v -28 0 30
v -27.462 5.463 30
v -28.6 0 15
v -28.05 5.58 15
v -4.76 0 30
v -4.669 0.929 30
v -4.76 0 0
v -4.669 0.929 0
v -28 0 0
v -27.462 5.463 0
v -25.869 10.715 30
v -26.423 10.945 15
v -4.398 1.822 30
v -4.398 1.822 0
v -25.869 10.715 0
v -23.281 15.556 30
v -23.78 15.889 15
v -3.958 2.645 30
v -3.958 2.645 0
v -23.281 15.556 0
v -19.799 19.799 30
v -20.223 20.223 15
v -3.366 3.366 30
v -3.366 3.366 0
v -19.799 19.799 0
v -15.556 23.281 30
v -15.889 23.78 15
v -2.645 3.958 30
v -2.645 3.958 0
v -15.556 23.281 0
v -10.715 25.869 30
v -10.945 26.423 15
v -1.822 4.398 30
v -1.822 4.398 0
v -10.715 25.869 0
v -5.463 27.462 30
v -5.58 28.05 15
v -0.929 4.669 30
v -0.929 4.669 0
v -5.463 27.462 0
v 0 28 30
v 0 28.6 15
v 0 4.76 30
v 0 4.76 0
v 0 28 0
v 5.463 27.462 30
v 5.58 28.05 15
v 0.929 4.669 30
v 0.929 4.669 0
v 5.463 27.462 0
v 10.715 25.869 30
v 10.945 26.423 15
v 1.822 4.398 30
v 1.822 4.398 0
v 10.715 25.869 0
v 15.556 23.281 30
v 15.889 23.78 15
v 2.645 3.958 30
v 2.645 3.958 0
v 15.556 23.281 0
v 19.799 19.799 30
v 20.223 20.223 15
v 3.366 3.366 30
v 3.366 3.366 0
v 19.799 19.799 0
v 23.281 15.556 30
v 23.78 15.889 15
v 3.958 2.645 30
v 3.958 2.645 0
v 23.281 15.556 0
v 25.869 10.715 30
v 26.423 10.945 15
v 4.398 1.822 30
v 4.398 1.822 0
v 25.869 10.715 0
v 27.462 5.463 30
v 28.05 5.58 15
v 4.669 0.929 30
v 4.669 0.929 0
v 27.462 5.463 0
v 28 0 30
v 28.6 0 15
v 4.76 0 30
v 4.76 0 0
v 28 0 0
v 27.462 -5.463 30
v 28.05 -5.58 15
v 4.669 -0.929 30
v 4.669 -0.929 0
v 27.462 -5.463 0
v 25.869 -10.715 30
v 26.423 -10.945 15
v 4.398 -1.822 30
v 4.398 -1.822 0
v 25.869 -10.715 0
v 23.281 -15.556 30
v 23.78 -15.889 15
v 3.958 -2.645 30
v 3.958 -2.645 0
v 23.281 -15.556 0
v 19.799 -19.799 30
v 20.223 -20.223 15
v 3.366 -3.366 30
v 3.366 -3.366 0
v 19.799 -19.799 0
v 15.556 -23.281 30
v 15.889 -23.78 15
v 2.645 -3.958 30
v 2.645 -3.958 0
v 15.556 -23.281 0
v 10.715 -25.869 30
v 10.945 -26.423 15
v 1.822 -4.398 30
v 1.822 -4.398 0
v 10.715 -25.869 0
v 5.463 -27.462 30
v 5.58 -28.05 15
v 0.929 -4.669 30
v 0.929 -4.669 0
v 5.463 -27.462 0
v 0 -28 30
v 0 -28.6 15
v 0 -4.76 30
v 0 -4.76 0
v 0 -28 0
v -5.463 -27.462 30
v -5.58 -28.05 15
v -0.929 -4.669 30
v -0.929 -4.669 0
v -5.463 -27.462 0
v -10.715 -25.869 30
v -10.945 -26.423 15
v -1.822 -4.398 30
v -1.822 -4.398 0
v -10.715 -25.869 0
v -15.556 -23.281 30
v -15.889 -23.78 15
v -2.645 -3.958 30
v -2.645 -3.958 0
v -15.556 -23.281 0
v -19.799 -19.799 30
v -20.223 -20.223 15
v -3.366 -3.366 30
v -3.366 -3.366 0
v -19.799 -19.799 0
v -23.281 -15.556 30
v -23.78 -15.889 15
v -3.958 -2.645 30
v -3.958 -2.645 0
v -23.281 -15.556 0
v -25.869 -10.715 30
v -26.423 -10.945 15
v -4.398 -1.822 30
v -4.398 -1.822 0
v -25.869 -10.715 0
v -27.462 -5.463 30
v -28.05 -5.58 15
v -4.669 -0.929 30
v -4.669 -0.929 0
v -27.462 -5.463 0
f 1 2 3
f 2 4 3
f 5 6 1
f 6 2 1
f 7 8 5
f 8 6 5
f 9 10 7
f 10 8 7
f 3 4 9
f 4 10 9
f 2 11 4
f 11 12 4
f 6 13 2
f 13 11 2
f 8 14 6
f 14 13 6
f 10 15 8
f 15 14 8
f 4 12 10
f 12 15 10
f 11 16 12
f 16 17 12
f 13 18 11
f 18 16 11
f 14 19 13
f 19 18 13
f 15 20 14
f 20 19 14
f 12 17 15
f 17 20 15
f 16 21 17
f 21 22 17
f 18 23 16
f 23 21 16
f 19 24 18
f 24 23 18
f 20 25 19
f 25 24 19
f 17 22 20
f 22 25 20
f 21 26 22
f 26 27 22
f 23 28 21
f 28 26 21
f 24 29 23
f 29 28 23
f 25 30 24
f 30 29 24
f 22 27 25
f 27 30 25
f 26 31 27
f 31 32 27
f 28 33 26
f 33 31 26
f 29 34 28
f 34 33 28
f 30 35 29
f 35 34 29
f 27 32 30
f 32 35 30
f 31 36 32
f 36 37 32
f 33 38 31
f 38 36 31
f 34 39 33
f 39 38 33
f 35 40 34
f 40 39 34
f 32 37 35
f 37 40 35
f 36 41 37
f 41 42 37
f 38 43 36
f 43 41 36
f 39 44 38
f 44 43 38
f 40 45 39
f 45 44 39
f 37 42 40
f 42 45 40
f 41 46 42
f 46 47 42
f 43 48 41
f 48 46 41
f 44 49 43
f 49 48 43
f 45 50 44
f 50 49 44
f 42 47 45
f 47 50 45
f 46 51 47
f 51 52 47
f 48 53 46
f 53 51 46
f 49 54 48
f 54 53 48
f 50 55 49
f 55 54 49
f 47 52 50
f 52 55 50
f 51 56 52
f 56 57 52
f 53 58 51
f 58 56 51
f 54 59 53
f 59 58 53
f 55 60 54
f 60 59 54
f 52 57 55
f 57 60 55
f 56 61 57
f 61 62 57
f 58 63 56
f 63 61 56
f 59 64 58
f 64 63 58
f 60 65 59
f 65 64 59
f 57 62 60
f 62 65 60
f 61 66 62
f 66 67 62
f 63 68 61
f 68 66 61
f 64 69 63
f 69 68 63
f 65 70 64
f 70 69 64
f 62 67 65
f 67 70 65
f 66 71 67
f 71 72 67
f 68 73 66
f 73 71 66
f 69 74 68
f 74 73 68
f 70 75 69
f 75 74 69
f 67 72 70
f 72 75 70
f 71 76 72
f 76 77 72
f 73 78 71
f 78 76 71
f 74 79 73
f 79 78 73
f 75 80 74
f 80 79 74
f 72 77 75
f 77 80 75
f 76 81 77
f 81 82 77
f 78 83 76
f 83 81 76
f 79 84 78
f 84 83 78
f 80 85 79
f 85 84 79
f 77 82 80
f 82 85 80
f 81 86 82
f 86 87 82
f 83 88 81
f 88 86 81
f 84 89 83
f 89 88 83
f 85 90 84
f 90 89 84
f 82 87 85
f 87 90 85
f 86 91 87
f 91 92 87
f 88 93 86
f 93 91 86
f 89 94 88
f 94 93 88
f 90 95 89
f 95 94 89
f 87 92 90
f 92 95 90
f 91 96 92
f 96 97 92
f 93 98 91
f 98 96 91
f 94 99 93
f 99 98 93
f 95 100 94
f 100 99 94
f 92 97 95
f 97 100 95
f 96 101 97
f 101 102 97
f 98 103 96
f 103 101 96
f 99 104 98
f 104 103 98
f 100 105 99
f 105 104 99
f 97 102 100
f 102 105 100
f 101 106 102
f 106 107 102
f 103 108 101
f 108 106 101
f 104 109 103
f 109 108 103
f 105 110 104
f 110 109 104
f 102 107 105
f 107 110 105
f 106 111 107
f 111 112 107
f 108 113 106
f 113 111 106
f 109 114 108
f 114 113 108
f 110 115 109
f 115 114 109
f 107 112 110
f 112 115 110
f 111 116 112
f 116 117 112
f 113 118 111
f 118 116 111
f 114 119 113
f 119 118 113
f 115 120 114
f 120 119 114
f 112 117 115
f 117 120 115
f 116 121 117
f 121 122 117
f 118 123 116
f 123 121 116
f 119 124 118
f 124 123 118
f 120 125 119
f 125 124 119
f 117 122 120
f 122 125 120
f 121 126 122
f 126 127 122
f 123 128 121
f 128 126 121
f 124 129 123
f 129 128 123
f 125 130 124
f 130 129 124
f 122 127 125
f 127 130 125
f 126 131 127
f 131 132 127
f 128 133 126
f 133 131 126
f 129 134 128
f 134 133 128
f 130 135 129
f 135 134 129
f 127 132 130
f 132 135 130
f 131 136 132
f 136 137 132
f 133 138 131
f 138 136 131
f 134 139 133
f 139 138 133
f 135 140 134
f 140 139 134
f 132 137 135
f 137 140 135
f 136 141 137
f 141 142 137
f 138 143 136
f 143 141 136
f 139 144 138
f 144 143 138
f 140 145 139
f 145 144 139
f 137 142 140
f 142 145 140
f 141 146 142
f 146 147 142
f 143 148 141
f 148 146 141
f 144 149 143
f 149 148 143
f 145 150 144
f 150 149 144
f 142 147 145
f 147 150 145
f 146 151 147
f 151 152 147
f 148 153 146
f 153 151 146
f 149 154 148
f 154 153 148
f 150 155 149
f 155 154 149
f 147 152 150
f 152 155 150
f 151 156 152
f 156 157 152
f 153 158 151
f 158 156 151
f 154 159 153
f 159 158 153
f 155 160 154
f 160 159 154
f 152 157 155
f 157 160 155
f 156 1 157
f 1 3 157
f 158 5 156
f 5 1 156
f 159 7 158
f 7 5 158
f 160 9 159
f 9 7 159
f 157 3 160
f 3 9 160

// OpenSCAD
$fn = 32;

// ----------------------------------------------------------------------
// Belt roller: 56 mm barrel, 30 mm wide, bore 9.52 mm
// ----------------------------------------------------------------------

// --- parameters (mm) ---
bore_d = 9.52;            // bore
barrel_d = 56;            // barrel diameter
roller_w = 30;            // roller width
crown = 0.6;              // crown height at mid width

roller_profile = [[4.76, 0], [28, 0], [28.6, 15], [28, 30], [4.76, 30]];

/* the profile stays clear of the axis, so the bore comes out of the revolve */
rotate_extrude() polygon(roller_profile);
